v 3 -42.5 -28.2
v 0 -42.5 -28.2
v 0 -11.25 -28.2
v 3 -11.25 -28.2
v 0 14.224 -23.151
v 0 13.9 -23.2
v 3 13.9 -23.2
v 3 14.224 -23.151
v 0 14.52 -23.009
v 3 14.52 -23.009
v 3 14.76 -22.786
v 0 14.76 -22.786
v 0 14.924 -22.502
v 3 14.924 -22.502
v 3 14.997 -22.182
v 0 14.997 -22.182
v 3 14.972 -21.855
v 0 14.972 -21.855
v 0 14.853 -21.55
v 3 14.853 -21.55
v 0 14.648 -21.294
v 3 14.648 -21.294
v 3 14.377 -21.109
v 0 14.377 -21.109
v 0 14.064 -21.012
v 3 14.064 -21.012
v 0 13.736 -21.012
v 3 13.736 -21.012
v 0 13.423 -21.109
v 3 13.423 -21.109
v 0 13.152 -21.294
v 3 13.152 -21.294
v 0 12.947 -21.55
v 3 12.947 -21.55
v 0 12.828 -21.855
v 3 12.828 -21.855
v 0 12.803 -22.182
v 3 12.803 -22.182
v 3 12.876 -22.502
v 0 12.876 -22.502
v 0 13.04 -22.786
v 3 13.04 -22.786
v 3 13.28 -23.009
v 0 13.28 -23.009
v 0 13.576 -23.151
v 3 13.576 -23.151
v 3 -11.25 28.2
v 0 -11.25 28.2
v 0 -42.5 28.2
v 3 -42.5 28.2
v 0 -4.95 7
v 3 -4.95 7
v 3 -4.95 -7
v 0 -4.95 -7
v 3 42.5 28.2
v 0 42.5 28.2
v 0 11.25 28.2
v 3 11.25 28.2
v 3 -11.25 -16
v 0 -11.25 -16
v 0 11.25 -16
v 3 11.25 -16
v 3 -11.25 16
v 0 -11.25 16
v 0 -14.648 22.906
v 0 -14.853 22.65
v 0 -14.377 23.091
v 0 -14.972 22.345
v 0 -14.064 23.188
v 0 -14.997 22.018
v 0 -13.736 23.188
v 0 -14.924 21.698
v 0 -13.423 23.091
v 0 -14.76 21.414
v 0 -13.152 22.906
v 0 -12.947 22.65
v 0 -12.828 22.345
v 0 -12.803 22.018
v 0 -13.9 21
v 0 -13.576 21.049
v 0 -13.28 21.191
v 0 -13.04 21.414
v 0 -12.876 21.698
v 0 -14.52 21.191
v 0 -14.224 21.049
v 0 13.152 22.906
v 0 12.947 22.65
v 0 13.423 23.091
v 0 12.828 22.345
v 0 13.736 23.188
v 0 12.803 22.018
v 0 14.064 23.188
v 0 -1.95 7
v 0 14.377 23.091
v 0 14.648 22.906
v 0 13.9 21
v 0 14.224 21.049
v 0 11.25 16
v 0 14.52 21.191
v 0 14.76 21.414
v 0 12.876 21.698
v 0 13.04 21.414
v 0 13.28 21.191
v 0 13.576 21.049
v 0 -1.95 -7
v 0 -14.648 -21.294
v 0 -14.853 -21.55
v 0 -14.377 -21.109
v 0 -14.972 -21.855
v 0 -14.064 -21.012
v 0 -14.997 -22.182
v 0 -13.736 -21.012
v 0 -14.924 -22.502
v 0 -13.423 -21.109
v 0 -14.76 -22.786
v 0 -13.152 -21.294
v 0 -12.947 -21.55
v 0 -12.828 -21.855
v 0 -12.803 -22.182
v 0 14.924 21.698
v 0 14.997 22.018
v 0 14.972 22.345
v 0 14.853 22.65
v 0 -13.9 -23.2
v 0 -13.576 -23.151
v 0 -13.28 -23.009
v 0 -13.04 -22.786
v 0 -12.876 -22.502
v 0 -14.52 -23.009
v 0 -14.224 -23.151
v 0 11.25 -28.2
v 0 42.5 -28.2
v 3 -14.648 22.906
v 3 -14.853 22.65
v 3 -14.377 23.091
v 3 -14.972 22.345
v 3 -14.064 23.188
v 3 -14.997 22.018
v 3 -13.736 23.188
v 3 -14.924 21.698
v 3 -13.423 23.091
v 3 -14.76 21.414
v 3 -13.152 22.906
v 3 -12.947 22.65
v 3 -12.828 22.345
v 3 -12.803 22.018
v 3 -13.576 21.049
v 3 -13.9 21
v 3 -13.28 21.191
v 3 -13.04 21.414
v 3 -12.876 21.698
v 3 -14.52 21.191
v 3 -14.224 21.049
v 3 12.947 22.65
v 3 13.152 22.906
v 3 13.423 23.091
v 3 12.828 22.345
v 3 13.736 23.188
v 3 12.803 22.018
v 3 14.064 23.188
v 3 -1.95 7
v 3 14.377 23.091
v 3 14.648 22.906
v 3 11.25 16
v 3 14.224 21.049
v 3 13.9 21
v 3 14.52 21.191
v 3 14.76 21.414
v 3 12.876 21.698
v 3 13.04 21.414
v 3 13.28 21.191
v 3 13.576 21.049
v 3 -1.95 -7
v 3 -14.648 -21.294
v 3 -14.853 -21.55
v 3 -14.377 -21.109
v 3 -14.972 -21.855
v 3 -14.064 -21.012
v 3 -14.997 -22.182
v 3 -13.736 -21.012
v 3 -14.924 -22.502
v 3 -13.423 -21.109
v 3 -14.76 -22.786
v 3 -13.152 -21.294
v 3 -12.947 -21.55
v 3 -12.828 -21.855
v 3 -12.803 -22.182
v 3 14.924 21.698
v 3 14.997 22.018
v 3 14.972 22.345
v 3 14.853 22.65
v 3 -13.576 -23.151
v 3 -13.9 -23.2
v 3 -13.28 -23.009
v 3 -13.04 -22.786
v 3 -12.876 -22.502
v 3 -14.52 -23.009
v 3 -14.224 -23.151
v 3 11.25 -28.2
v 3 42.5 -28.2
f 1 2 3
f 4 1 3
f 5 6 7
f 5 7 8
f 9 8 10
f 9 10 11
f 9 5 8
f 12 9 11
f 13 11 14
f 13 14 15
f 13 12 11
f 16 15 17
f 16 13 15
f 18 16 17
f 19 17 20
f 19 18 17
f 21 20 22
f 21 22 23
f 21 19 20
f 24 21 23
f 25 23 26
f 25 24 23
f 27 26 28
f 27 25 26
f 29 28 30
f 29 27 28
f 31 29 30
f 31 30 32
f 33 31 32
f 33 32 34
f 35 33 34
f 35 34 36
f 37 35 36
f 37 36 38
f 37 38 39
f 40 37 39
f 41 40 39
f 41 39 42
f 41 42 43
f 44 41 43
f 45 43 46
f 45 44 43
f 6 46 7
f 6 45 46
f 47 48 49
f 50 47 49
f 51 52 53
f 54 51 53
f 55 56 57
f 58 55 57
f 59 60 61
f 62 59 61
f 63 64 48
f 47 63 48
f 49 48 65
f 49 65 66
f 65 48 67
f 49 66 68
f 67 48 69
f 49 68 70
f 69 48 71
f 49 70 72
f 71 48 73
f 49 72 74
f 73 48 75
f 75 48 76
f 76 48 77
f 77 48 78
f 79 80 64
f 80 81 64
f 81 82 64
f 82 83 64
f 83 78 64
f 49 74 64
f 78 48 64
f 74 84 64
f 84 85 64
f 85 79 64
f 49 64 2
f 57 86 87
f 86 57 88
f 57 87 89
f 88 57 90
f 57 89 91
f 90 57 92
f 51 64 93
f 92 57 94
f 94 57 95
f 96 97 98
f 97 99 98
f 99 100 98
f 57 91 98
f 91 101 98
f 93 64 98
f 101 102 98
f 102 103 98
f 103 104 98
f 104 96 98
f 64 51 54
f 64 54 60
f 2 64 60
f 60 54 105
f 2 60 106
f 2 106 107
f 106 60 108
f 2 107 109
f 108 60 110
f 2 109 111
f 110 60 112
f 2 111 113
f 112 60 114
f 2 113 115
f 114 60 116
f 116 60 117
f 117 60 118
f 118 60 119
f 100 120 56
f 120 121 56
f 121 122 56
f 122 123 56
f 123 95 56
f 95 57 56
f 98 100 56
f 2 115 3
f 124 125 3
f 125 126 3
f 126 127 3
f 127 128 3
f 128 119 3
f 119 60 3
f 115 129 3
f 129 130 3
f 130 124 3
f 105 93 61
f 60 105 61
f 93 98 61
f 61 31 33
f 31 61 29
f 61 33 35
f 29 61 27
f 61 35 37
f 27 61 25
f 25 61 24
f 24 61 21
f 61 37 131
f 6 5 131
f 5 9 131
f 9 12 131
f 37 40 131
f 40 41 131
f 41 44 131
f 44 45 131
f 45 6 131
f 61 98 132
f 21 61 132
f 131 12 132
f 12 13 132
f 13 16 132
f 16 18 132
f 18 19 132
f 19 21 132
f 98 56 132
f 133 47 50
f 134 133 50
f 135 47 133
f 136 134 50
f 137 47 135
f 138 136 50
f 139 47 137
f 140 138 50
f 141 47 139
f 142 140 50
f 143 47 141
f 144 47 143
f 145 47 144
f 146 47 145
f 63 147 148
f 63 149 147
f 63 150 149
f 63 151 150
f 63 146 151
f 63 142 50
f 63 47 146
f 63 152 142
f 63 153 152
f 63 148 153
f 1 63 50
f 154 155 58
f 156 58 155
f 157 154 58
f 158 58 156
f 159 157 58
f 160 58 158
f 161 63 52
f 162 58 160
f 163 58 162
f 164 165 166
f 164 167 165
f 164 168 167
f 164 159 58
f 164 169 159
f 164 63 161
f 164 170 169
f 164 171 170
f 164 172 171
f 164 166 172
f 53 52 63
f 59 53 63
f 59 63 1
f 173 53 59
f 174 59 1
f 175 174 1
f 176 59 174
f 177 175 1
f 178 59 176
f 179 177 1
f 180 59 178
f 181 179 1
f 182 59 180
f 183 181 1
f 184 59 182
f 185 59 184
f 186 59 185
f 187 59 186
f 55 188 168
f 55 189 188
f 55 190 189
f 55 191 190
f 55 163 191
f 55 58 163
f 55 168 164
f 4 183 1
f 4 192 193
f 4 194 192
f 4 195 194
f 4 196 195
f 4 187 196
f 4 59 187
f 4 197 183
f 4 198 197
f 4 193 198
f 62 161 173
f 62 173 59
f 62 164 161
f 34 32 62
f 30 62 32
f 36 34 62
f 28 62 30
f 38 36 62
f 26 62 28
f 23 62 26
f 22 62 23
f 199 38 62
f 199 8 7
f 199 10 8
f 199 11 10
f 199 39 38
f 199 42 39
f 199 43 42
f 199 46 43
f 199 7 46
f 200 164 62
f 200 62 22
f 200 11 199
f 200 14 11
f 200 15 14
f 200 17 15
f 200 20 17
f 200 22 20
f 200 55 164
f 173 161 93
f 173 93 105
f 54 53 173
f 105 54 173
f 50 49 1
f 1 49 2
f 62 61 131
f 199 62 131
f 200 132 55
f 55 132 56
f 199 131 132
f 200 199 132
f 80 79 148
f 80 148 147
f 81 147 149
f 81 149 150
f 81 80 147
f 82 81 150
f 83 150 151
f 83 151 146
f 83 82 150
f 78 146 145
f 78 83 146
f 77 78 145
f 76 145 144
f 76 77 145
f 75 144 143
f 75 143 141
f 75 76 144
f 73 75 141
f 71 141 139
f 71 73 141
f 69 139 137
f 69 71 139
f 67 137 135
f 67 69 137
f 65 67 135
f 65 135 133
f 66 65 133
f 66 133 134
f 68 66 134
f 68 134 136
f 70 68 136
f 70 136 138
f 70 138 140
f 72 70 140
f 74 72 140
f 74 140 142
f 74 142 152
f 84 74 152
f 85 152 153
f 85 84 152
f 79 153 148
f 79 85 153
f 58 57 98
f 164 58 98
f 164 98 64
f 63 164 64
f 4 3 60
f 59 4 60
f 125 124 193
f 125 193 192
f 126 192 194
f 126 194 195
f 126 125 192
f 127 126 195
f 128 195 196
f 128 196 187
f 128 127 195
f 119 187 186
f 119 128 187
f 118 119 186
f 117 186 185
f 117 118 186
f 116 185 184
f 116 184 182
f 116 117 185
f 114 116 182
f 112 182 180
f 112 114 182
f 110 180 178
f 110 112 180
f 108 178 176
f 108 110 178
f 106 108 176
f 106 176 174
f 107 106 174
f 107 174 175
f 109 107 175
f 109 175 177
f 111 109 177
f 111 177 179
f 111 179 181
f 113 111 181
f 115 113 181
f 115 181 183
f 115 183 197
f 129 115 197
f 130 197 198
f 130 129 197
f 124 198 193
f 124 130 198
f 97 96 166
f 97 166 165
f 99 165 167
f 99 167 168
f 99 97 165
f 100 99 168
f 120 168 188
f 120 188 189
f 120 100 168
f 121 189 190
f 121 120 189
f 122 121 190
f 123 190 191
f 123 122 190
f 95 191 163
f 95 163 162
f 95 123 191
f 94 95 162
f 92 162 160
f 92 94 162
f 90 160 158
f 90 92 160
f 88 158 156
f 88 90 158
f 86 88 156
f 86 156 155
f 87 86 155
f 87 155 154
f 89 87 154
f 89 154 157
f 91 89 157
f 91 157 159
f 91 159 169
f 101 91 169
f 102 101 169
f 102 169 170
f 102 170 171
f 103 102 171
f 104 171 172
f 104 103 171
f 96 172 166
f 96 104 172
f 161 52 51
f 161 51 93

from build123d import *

# Parameters (mm, degrees)
SKETCH1_R           = 1.1
BOSS_EXTRUDE1_DEPTH = 3
SKETCH2_W           = 14
SKETCH2_H           = 3
CUT_EXTRUDE1_DEPTH  = 3


with BuildPart() as part:
    # Sketch1 → Boss-Extrude1 (new body)
    with BuildSketch(Plane(origin=(0, 0, 0), x_dir=(0, 0, -1), z_dir=(1, 0, 0))):
        Polygon((-28.2, -42.5), (28.2, -42.5), (28.2, -11.25), (16, -11.25), (16, 11.25), (28.2, 11.25), (28.2, 42.5), (-28.2, 42.5), (-28.2, 11.25), (-16, 11.25), (-16, -11.25), (-28.2, -11.25), align=None)
        with Locations((22.1, 13.9)):
            Circle(SKETCH1_R, mode=Mode.SUBTRACT)
        with Locations((22.1, -13.9)):
            Circle(SKETCH1_R, mode=Mode.SUBTRACT)
        with Locations((-22.1, -13.9)):
            Circle(SKETCH1_R, mode=Mode.SUBTRACT)
        with Locations((-22.1, 13.9)):
            Circle(SKETCH1_R, mode=Mode.SUBTRACT)
    extrude(amount=BOSS_EXTRUDE1_DEPTH)

    # Sketch2 → Cut-Extrude1 (cut)
    with BuildSketch(Plane(origin=(3, 0, 0), x_dir=(0, 0, -1), z_dir=(1, 0, 0))):
        with Locations((0, -3.45)):
            Rectangle(SKETCH2_W, SKETCH2_H)
    extrude(amount=-CUT_EXTRUDE1_DEPTH, mode=Mode.SUBTRACT)


solid = part.part
